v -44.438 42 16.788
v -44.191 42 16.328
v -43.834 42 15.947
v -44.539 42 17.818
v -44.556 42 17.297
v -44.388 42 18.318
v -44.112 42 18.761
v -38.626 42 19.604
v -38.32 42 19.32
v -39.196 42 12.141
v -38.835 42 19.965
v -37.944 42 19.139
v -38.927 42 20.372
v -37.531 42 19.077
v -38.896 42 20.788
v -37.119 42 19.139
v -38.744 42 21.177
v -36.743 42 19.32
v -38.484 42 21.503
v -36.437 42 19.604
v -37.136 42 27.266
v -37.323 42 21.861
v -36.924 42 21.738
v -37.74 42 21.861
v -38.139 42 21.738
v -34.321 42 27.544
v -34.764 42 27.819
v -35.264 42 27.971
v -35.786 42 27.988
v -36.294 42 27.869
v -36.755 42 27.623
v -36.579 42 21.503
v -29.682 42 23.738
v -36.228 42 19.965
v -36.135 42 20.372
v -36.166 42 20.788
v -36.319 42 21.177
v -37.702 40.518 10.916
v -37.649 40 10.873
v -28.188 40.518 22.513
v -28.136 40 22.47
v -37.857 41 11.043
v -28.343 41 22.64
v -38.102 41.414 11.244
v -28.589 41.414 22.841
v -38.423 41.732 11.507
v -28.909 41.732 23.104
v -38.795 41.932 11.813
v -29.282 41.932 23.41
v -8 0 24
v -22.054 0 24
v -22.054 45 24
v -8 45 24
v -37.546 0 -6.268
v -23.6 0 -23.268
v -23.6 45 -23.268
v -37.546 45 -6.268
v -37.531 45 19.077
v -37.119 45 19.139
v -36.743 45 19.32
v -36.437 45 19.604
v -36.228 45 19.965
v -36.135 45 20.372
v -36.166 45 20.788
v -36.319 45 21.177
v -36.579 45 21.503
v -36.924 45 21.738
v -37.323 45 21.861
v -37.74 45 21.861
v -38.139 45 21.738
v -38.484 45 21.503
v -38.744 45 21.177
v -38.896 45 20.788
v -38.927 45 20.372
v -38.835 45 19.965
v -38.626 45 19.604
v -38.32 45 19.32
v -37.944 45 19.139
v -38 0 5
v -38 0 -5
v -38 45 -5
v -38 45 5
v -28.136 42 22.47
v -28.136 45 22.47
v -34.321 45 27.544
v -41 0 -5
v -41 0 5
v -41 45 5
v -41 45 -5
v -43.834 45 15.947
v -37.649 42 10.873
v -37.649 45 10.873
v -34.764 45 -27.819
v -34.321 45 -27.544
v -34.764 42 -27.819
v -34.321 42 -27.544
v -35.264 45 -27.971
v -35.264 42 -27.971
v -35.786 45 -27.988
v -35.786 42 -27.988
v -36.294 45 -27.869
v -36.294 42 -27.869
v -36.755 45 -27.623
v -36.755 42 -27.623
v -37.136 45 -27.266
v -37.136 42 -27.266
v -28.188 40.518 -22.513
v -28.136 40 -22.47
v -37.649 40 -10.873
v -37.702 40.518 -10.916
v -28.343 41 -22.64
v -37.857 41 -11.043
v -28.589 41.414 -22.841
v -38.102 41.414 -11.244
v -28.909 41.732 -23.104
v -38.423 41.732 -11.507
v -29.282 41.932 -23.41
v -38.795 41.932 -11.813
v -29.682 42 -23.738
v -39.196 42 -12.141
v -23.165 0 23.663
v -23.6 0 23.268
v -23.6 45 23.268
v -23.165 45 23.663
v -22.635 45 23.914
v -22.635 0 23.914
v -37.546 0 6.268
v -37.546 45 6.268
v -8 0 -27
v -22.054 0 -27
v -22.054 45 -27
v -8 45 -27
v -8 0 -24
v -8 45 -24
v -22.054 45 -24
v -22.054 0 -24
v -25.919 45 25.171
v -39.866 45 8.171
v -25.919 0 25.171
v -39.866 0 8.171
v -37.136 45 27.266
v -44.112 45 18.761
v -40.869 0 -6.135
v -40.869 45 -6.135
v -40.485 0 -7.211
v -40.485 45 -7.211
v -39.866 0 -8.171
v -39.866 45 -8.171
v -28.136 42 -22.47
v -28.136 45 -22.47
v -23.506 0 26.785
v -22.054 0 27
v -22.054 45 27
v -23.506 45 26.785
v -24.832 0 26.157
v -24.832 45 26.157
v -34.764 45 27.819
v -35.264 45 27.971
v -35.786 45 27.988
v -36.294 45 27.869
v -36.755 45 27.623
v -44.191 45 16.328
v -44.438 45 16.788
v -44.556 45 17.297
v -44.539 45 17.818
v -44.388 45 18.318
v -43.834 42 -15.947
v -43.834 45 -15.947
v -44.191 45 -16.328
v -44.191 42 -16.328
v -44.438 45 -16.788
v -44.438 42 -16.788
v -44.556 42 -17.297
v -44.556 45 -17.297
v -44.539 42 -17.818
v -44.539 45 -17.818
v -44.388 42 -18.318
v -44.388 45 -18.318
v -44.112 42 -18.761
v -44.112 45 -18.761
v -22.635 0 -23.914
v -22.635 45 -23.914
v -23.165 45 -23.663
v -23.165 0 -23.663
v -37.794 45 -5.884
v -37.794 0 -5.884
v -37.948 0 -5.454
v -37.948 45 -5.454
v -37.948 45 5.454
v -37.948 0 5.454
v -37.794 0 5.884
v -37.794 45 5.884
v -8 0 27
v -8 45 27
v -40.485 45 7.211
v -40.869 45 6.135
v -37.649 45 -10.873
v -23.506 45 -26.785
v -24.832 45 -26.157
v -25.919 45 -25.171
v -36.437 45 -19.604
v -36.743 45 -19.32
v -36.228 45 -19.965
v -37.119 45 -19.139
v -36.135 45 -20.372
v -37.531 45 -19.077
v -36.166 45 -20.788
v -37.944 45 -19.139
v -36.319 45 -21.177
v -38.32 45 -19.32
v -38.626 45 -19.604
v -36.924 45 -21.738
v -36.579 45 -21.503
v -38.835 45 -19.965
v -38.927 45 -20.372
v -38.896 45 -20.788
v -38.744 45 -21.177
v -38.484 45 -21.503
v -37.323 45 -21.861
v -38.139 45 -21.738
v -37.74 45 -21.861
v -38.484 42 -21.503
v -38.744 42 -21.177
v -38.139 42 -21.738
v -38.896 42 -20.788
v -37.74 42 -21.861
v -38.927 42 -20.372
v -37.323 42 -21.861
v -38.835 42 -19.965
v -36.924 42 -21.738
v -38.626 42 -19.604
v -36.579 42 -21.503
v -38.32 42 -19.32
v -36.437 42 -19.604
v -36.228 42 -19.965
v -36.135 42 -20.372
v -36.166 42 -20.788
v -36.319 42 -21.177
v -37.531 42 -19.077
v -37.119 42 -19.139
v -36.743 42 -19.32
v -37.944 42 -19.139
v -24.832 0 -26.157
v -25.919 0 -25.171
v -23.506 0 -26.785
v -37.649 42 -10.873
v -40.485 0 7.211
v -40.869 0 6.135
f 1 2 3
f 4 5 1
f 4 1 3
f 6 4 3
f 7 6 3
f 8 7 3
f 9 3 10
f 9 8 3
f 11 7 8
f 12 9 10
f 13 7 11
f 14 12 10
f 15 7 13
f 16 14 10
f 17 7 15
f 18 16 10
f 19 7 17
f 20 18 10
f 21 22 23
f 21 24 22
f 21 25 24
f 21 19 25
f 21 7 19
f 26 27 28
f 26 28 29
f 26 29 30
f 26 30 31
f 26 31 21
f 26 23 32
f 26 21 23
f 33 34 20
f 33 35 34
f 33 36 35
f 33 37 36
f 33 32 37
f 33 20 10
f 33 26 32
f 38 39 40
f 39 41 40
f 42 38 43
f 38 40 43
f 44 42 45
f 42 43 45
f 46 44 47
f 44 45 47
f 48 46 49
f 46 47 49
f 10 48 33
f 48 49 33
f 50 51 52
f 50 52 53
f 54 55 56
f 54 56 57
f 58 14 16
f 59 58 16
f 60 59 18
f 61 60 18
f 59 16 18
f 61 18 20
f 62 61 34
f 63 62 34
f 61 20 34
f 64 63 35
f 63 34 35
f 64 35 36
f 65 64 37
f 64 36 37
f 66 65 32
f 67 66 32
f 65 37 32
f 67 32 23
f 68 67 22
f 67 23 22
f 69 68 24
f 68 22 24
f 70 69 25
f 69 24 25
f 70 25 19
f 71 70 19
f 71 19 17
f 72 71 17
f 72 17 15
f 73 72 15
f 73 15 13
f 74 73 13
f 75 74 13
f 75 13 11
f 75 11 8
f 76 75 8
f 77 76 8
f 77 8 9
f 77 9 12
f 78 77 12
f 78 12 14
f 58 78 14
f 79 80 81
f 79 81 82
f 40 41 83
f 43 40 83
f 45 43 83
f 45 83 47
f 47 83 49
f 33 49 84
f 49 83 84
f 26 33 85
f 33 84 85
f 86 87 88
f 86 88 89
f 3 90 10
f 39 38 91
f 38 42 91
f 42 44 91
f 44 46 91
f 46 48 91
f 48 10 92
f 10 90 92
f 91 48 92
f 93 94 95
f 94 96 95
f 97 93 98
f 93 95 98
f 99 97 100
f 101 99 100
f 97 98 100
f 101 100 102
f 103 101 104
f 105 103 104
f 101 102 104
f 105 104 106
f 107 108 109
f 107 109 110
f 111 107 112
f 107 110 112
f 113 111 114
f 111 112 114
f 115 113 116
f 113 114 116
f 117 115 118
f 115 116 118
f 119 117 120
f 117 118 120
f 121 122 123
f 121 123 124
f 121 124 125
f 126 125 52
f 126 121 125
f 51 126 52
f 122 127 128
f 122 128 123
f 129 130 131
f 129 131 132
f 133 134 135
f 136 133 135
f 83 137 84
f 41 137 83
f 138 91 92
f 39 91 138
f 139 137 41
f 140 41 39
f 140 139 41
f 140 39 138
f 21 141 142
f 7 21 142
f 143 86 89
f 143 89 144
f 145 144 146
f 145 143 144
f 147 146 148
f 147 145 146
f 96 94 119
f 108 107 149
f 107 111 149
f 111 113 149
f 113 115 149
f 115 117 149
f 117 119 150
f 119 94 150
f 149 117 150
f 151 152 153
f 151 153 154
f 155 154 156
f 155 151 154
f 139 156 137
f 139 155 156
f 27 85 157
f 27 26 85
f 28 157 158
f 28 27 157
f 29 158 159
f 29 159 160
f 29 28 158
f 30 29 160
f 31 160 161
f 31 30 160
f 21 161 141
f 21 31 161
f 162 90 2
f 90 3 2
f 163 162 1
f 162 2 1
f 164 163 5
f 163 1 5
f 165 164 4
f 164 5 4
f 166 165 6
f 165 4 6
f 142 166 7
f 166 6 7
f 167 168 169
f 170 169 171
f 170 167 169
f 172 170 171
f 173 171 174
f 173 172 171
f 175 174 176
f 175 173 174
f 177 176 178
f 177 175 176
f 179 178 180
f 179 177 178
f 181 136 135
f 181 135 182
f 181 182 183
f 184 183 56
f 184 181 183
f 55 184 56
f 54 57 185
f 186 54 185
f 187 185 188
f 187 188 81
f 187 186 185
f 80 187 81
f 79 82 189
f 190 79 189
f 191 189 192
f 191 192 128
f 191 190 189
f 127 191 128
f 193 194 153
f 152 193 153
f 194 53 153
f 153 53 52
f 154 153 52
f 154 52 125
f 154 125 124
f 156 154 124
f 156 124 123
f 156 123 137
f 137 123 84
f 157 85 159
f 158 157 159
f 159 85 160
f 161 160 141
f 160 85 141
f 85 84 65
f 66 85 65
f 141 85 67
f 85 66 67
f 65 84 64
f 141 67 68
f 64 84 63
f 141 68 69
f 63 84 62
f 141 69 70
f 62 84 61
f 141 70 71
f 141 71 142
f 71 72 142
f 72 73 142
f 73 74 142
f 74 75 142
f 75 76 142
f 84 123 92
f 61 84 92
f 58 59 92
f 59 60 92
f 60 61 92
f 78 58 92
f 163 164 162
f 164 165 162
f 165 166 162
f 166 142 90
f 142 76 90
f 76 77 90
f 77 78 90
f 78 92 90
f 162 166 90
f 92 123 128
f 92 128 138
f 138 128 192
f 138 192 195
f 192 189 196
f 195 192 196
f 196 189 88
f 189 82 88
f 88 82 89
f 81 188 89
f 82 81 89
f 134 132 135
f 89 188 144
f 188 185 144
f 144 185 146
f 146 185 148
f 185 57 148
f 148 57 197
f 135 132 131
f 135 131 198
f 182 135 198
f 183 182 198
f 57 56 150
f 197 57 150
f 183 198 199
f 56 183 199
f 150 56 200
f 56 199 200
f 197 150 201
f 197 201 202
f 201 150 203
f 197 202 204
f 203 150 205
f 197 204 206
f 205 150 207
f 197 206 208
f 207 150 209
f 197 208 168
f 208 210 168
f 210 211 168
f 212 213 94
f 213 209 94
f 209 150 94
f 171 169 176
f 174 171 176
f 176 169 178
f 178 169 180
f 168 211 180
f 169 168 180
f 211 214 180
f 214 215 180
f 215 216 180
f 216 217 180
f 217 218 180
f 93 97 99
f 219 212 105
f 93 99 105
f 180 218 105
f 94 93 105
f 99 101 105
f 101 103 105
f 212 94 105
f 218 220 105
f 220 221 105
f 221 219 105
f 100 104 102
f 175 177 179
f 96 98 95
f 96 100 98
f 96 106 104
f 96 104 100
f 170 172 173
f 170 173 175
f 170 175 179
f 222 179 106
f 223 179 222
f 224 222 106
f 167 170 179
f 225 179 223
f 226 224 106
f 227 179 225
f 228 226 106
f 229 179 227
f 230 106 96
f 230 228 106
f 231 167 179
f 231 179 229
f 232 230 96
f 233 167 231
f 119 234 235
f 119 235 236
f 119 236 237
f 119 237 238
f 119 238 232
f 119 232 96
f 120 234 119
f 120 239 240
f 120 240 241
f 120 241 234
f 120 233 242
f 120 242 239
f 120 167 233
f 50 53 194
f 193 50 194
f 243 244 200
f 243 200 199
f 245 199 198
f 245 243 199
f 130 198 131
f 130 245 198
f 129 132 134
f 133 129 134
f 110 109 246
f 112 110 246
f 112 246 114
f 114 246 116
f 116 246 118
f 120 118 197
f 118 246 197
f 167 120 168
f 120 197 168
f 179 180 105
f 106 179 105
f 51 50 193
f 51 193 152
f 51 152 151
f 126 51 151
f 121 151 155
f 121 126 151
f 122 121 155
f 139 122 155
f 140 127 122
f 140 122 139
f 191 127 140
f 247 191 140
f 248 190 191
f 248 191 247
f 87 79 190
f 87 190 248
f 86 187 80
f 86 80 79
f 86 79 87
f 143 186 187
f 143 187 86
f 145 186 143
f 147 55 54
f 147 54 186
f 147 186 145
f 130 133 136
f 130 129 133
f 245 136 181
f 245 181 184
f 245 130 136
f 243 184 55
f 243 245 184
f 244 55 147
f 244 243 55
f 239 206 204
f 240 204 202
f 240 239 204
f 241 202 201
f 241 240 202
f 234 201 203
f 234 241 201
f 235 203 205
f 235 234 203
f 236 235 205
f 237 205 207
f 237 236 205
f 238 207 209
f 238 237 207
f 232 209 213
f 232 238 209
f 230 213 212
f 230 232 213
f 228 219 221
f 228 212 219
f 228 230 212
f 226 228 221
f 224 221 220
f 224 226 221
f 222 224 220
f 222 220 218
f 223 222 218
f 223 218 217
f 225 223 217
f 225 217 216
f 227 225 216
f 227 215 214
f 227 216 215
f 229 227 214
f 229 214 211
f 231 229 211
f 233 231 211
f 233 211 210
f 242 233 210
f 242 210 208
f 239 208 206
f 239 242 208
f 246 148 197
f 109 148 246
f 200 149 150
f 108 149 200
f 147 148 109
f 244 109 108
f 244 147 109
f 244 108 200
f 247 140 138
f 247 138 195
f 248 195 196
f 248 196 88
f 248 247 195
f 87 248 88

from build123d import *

# Parameters (mm, degrees)
BOSS_EXTRUDE1_DEPTH = 45
BOSS_EXTRUDE2_DEPTH = 3
FILLET1_R           = 2
SKETCH5_R           = 1.4
CUT_EXTRUDE1_DEPTH  = 68.3348504


with BuildPart() as part:
    # Sketch3 → Boss-Extrude1 (new body)
    with BuildSketch(Plane(origin=(0, 0, 0), x_dir=(1, 0, 0), z_dir=(0, 1, 0))):
        with BuildLine():
            Line((-8, 24), (-22.053839059, 24))
            ThreePointArc((-22.053839059, 24), (-22.90912017, 23.807897735), (-23.600099843, 23.268494221))
            Line((-23.600099843, 23.268494221), (-37.546260784, 6.268494221))
            ThreePointArc((-37.546260784, 6.268494221), (-37.883151822, 5.673601675), (-38, 5))
            Line((-38, 5), (-38, -5))
            ThreePointArc((-38, -5), (-37.883151822, -5.673601675), (-37.546260784, -6.268494221))
            Line((-37.546260784, -6.268494221), (-23.600099843, -23.268494221))
            ThreePointArc((-23.600099843, -23.268494221), (-22.90912017, -23.807897735), (-22.053839059, -24))
            Line((-22.053839059, -24), (-8, -24))
            Line((-8, -24), (-8, -27))
            Line((-8, -27), (-22.053839059, -27))
            ThreePointArc((-22.053839059, -27), (-24.192041837, -26.519744338), (-25.919491019, -25.171235552))
            Line((-25.919491019, -25.171235552), (-39.86565196, -8.171235552))
            ThreePointArc((-39.86565196, -8.171235552), (-40.707879555, -6.684004186), (-41, -5))
            Line((-41, -5), (-41, 5))
            ThreePointArc((-41, 5), (-40.707879555, 6.684004186), (-39.86565196, 8.171235552))
            Line((-39.86565196, 8.171235552), (-25.919491019, 25.171235552))
            ThreePointArc((-25.919491019, 25.171235552), (-24.192041837, 26.519744338), (-22.053839059, 27))
            Line((-22.053839059, 27), (-8, 27))
            Line((-8, 27), (-8, 24))
        make_face()
    extrude(amount=BOSS_EXTRUDE1_DEPTH)

    # Sketch4 → Boss-Extrude2 (add)
    with BuildSketch(Plane.XZ.offset(-45)):
        Polygon((-28.135718162, 22.469713492), (-35.867022082, 28.812184595), (-45.380728737, 17.215228715), (-37.649424817, 10.872757612), align=None)
        Polygon((-37.649424817, -10.872757612), (-45.380728737, -17.215228715), (-35.867022082, -28.812184595), (-28.135718162, -22.469713492), align=None)
    extrude(amount=BOSS_EXTRUDE2_DEPTH)

    # Fillet1
    fillet1_edges = [part.edges().sort_by_distance(p)[0] for p in [
        (-35.867022082, 43.5, 28.812184595),
        (-45.380728737, 43.5, 17.215228715),
        (-32.892571489, 42, 16.671235552),
        (-45.380728737, 43.5, -17.215228715),
        (-35.867022082, 43.5, -28.812184595),
        (-32.892571489, 42, -16.671235552),
    ]]
    fillet(fillet1_edges, radius=FILLET1_R)

    # Sketch5 → Cut-Extrude1 (cut, through all)
    with BuildSketch(Plane.XZ.offset(-42)):
        with Locations(Location((-37.531353842, 20.476718214, 0), (0, 0, 270))):
            Circle(SKETCH5_R)
    cut_extrude1 = extrude(amount=-CUT_EXTRUDE1_DEPTH, mode=Mode.SUBTRACT)

    # Mirror1: Cut-Extrude1 across plane
    add(cut_extrude1.mirror(Plane.XY), mode=Mode.SUBTRACT)


solid = part.part
